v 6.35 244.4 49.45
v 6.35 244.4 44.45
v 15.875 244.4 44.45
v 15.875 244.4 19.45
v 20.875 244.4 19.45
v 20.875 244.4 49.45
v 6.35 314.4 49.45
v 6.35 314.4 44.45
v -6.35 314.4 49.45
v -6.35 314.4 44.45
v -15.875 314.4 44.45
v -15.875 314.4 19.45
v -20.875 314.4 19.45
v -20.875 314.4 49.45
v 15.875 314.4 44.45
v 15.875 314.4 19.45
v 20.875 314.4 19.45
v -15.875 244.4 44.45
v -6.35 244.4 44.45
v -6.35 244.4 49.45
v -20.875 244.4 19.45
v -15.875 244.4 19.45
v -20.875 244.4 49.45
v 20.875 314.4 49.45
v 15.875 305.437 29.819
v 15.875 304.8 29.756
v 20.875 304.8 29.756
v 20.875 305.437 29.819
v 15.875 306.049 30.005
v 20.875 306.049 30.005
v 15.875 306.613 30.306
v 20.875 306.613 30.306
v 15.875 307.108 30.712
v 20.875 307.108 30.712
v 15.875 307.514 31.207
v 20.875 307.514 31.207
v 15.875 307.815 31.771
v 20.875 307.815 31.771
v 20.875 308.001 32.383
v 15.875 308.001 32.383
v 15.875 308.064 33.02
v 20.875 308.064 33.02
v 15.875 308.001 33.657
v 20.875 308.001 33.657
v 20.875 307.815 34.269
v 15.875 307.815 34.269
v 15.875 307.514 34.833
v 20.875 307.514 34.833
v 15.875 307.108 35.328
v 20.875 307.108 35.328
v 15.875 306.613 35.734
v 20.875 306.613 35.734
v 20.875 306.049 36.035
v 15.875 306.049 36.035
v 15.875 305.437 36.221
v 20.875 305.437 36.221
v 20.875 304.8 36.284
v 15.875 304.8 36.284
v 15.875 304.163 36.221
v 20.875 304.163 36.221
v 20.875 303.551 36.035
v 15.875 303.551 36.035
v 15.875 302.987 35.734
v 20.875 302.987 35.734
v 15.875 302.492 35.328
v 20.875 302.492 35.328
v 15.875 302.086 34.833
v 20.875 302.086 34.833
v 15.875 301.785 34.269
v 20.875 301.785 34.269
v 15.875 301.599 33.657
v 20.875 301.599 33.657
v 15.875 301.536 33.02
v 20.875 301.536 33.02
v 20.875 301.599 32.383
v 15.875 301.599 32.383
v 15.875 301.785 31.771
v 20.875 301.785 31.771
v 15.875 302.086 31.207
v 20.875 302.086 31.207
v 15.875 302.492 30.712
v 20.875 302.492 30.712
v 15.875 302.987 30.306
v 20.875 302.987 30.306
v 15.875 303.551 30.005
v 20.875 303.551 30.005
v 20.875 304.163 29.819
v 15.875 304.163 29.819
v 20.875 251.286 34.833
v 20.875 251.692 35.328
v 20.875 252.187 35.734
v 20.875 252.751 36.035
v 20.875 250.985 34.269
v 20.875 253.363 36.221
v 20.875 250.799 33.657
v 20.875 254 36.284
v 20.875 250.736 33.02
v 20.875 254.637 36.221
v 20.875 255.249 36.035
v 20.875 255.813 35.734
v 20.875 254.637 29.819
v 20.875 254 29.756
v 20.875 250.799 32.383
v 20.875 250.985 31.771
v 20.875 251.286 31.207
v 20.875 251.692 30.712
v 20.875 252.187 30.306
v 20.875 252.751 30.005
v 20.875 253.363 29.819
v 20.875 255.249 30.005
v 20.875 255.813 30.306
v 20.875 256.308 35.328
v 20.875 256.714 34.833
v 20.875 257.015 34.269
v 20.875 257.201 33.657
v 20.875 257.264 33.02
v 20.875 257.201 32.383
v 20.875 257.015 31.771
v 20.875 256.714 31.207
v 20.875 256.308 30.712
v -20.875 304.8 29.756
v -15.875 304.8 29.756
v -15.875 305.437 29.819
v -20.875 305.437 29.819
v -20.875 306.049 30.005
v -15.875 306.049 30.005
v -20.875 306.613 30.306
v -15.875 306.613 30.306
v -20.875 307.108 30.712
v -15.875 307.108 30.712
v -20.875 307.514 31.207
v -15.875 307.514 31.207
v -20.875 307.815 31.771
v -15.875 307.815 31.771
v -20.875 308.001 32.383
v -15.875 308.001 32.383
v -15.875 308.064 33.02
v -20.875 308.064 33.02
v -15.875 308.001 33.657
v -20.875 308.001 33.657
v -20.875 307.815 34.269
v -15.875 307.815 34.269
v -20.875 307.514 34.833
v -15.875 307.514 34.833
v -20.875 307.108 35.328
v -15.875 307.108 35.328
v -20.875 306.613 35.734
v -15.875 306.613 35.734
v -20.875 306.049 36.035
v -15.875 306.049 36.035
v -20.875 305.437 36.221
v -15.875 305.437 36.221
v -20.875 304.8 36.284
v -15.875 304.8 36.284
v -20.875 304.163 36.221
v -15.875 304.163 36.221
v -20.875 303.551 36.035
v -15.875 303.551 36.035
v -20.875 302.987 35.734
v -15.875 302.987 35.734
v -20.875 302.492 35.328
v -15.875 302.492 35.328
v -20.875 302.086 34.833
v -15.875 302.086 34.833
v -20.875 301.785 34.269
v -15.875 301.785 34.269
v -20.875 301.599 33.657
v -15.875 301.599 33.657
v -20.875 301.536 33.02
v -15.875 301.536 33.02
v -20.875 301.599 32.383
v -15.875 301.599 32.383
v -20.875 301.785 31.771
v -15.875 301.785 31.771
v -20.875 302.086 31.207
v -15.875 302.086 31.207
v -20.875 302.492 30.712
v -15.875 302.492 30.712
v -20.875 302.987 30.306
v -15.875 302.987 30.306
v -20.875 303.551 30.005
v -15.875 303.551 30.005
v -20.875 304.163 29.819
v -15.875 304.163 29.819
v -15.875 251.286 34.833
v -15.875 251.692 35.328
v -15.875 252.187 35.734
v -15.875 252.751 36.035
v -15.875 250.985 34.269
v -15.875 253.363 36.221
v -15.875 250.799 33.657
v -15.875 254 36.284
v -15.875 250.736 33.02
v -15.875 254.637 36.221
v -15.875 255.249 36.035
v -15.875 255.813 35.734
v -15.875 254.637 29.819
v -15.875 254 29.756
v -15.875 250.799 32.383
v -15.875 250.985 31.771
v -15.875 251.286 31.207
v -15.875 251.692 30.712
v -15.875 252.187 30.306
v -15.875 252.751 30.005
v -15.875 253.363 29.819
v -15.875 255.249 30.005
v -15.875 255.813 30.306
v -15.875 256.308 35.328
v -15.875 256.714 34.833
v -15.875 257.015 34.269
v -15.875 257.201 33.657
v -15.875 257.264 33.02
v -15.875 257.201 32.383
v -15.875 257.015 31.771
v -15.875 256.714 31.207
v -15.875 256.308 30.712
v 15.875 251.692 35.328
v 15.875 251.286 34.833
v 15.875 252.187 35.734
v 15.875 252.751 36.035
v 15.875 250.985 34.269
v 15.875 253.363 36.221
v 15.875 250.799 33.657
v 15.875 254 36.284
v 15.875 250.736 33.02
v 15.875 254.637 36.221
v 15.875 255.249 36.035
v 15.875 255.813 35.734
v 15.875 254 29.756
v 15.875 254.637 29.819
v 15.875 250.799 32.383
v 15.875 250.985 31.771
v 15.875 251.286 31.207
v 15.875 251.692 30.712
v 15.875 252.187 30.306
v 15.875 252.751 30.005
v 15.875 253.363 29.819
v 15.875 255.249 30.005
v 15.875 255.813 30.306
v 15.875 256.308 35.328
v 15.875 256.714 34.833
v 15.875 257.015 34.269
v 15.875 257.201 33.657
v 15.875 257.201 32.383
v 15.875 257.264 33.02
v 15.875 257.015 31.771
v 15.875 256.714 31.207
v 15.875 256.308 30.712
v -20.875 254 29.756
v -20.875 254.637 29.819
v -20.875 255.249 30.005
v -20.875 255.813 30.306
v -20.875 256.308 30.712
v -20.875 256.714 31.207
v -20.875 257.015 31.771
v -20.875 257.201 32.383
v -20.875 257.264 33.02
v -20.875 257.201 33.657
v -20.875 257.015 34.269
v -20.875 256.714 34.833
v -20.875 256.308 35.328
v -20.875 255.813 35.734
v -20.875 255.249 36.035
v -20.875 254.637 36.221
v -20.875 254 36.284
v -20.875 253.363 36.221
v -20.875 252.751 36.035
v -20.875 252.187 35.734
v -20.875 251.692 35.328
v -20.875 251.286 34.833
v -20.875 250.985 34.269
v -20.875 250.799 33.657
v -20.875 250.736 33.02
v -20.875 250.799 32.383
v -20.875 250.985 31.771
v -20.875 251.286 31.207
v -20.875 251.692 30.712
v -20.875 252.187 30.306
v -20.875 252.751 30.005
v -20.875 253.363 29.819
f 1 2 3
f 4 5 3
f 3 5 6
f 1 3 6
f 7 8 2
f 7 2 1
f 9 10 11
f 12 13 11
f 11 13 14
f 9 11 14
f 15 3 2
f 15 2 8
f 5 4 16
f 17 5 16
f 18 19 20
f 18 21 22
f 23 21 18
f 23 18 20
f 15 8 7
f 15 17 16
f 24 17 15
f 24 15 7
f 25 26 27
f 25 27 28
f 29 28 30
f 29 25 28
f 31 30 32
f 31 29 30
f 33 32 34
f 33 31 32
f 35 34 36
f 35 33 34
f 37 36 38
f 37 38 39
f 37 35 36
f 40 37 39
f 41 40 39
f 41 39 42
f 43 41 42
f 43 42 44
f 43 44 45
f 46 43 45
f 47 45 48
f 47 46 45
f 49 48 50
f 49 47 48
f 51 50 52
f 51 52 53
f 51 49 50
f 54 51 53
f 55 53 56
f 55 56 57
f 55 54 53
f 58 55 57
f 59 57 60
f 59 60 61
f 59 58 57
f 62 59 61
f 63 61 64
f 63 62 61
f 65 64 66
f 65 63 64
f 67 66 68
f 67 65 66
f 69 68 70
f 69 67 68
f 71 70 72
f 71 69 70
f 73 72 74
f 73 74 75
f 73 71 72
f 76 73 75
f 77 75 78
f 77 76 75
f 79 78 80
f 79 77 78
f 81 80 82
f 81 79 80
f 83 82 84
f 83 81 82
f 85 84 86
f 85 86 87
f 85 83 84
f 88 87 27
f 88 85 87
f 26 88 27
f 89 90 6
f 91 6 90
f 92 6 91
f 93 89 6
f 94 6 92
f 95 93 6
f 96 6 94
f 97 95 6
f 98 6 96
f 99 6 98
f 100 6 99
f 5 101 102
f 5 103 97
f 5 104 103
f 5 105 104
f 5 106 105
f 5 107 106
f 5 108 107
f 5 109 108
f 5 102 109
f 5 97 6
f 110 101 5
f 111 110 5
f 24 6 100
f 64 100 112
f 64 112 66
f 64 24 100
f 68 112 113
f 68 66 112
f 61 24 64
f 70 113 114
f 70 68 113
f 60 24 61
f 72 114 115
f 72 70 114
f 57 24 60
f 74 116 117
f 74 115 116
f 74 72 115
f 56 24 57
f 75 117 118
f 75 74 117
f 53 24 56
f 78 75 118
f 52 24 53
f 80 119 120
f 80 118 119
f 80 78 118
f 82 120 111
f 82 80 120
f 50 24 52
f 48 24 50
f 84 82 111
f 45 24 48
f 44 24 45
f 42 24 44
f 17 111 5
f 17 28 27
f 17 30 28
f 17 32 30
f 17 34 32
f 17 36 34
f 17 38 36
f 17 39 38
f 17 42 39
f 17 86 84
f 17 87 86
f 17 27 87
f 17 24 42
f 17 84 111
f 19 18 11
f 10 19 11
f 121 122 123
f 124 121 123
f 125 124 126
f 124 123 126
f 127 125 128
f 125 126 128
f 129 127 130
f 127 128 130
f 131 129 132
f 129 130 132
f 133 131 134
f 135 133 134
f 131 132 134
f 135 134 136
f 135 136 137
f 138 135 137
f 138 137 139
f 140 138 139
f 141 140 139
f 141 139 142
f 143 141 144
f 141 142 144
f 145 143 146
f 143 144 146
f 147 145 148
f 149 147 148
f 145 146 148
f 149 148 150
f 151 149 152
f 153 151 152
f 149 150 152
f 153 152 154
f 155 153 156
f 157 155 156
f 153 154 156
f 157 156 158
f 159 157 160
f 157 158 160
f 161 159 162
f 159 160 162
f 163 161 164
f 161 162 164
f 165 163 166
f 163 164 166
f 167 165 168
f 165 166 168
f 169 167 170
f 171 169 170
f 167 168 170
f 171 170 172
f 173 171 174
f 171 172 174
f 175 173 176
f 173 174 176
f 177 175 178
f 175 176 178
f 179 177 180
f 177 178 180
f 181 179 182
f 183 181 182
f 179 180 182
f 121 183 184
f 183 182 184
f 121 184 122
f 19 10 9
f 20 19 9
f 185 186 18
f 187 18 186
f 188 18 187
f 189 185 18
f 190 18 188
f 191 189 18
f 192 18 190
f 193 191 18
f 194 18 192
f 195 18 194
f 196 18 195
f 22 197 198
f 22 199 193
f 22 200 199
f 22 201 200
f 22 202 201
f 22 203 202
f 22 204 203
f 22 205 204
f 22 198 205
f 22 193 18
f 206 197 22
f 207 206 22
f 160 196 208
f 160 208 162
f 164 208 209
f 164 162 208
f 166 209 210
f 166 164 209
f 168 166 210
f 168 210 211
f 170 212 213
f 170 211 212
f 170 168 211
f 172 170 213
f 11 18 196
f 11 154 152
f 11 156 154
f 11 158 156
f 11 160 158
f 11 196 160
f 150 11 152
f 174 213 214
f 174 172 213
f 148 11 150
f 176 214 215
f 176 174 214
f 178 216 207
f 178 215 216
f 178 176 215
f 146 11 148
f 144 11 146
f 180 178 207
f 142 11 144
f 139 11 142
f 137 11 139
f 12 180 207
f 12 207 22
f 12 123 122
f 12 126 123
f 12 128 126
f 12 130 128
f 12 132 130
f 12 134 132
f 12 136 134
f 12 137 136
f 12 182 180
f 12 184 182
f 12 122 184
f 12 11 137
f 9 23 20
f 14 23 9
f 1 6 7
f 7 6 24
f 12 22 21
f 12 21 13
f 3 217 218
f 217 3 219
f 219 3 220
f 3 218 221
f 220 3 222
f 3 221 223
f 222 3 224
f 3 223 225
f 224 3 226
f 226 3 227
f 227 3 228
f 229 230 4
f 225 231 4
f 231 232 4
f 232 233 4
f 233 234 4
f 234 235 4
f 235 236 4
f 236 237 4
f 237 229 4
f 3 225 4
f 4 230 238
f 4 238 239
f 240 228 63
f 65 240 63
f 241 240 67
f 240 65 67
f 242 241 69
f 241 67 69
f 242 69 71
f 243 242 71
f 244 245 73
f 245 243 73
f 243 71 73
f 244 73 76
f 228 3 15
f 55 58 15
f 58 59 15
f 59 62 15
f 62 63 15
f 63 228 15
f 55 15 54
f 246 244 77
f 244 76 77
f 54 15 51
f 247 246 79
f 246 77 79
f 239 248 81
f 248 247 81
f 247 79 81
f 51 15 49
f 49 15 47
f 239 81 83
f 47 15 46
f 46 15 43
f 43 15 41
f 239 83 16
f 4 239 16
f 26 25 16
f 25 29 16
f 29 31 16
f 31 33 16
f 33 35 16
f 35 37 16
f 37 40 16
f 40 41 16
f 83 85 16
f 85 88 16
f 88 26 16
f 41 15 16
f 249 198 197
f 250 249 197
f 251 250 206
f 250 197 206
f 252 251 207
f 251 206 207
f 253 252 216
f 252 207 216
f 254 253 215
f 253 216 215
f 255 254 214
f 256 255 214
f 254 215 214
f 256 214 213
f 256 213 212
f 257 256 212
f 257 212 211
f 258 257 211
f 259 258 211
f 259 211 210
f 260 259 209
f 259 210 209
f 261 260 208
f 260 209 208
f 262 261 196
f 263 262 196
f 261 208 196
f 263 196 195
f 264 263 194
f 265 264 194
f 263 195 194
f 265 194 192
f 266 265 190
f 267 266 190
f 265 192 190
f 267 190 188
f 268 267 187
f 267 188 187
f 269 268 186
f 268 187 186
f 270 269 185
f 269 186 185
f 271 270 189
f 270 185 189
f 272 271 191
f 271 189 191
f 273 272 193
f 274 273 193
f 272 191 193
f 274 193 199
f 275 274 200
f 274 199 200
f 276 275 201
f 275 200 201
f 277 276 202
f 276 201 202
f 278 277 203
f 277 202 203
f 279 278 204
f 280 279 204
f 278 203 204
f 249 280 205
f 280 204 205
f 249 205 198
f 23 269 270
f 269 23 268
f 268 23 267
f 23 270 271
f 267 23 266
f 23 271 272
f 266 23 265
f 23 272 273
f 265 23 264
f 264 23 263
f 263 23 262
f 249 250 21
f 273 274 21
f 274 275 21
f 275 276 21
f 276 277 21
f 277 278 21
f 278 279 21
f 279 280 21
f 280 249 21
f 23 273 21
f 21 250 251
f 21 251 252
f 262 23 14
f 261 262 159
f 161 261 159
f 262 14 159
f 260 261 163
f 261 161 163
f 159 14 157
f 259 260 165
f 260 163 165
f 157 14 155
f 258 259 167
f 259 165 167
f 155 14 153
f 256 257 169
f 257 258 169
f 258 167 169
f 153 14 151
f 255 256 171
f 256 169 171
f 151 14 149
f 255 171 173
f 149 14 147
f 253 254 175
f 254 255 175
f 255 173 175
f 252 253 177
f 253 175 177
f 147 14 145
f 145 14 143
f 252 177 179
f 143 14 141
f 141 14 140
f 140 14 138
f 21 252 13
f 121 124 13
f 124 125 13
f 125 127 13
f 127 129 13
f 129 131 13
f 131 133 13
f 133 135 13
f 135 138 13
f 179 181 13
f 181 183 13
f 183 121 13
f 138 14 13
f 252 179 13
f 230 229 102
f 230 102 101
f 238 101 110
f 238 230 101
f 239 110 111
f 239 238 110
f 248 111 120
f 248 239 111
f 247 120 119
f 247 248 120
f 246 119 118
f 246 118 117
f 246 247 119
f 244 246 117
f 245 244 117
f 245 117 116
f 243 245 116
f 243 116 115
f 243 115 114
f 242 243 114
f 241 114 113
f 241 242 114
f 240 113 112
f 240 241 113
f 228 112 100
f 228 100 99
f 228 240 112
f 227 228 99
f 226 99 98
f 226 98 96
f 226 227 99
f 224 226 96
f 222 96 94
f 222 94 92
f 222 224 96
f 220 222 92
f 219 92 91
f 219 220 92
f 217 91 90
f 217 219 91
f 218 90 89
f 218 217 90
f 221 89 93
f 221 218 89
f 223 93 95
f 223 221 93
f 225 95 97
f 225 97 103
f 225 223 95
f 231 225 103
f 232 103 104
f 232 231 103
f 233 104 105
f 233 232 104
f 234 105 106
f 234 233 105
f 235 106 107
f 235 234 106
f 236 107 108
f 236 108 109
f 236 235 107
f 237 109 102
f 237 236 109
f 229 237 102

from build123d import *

# Parameters (mm, degrees)
SKETCH1_W           = 30
SKETCH1_H           = 70
SKETCH1_R           = 3.2639
BOSS_EXTRUDE1_DEPTH = 5
SKETCH2_W           = 5
SKETCH2_H           = 70
BOSS_EXTRUDE2_DEPTH = 9.525


with BuildPart() as part:
    # Sketch1 → Boss-Extrude1 (new body)
    with BuildSketch(Plane(origin=(15.875, 0, 0), x_dir=(0, 0, -1), z_dir=(1, 0, 0))):
        with Locations((-34.45, 279.4)):
            Rectangle(SKETCH1_W, SKETCH1_H)
        with Locations((-33.02, 254)):
            Circle(SKETCH1_R, mode=Mode.SUBTRACT)
        with Locations((-33.02, 304.8)):
            Circle(SKETCH1_R, mode=Mode.SUBTRACT)
    extrude(amount=BOSS_EXTRUDE1_DEPTH)

    # Sketch2 → Boss-Extrude2 (add)
    with BuildSketch(Plane.ZY.offset(-15.875)):
        with Locations((46.95, 279.4)):
            Rectangle(SKETCH2_W, SKETCH2_H)
    extrude(amount=BOSS_EXTRUDE2_DEPTH)


with BuildPart() as body_2:
    # Mirror2: mirrored copy
    add(part.part.mirror(Plane(origin=(0, 0, 0), x_dir=(0, 0, 1), z_dir=(1, 0, 0))))


solid = Compound([part.part, body_2.part])
